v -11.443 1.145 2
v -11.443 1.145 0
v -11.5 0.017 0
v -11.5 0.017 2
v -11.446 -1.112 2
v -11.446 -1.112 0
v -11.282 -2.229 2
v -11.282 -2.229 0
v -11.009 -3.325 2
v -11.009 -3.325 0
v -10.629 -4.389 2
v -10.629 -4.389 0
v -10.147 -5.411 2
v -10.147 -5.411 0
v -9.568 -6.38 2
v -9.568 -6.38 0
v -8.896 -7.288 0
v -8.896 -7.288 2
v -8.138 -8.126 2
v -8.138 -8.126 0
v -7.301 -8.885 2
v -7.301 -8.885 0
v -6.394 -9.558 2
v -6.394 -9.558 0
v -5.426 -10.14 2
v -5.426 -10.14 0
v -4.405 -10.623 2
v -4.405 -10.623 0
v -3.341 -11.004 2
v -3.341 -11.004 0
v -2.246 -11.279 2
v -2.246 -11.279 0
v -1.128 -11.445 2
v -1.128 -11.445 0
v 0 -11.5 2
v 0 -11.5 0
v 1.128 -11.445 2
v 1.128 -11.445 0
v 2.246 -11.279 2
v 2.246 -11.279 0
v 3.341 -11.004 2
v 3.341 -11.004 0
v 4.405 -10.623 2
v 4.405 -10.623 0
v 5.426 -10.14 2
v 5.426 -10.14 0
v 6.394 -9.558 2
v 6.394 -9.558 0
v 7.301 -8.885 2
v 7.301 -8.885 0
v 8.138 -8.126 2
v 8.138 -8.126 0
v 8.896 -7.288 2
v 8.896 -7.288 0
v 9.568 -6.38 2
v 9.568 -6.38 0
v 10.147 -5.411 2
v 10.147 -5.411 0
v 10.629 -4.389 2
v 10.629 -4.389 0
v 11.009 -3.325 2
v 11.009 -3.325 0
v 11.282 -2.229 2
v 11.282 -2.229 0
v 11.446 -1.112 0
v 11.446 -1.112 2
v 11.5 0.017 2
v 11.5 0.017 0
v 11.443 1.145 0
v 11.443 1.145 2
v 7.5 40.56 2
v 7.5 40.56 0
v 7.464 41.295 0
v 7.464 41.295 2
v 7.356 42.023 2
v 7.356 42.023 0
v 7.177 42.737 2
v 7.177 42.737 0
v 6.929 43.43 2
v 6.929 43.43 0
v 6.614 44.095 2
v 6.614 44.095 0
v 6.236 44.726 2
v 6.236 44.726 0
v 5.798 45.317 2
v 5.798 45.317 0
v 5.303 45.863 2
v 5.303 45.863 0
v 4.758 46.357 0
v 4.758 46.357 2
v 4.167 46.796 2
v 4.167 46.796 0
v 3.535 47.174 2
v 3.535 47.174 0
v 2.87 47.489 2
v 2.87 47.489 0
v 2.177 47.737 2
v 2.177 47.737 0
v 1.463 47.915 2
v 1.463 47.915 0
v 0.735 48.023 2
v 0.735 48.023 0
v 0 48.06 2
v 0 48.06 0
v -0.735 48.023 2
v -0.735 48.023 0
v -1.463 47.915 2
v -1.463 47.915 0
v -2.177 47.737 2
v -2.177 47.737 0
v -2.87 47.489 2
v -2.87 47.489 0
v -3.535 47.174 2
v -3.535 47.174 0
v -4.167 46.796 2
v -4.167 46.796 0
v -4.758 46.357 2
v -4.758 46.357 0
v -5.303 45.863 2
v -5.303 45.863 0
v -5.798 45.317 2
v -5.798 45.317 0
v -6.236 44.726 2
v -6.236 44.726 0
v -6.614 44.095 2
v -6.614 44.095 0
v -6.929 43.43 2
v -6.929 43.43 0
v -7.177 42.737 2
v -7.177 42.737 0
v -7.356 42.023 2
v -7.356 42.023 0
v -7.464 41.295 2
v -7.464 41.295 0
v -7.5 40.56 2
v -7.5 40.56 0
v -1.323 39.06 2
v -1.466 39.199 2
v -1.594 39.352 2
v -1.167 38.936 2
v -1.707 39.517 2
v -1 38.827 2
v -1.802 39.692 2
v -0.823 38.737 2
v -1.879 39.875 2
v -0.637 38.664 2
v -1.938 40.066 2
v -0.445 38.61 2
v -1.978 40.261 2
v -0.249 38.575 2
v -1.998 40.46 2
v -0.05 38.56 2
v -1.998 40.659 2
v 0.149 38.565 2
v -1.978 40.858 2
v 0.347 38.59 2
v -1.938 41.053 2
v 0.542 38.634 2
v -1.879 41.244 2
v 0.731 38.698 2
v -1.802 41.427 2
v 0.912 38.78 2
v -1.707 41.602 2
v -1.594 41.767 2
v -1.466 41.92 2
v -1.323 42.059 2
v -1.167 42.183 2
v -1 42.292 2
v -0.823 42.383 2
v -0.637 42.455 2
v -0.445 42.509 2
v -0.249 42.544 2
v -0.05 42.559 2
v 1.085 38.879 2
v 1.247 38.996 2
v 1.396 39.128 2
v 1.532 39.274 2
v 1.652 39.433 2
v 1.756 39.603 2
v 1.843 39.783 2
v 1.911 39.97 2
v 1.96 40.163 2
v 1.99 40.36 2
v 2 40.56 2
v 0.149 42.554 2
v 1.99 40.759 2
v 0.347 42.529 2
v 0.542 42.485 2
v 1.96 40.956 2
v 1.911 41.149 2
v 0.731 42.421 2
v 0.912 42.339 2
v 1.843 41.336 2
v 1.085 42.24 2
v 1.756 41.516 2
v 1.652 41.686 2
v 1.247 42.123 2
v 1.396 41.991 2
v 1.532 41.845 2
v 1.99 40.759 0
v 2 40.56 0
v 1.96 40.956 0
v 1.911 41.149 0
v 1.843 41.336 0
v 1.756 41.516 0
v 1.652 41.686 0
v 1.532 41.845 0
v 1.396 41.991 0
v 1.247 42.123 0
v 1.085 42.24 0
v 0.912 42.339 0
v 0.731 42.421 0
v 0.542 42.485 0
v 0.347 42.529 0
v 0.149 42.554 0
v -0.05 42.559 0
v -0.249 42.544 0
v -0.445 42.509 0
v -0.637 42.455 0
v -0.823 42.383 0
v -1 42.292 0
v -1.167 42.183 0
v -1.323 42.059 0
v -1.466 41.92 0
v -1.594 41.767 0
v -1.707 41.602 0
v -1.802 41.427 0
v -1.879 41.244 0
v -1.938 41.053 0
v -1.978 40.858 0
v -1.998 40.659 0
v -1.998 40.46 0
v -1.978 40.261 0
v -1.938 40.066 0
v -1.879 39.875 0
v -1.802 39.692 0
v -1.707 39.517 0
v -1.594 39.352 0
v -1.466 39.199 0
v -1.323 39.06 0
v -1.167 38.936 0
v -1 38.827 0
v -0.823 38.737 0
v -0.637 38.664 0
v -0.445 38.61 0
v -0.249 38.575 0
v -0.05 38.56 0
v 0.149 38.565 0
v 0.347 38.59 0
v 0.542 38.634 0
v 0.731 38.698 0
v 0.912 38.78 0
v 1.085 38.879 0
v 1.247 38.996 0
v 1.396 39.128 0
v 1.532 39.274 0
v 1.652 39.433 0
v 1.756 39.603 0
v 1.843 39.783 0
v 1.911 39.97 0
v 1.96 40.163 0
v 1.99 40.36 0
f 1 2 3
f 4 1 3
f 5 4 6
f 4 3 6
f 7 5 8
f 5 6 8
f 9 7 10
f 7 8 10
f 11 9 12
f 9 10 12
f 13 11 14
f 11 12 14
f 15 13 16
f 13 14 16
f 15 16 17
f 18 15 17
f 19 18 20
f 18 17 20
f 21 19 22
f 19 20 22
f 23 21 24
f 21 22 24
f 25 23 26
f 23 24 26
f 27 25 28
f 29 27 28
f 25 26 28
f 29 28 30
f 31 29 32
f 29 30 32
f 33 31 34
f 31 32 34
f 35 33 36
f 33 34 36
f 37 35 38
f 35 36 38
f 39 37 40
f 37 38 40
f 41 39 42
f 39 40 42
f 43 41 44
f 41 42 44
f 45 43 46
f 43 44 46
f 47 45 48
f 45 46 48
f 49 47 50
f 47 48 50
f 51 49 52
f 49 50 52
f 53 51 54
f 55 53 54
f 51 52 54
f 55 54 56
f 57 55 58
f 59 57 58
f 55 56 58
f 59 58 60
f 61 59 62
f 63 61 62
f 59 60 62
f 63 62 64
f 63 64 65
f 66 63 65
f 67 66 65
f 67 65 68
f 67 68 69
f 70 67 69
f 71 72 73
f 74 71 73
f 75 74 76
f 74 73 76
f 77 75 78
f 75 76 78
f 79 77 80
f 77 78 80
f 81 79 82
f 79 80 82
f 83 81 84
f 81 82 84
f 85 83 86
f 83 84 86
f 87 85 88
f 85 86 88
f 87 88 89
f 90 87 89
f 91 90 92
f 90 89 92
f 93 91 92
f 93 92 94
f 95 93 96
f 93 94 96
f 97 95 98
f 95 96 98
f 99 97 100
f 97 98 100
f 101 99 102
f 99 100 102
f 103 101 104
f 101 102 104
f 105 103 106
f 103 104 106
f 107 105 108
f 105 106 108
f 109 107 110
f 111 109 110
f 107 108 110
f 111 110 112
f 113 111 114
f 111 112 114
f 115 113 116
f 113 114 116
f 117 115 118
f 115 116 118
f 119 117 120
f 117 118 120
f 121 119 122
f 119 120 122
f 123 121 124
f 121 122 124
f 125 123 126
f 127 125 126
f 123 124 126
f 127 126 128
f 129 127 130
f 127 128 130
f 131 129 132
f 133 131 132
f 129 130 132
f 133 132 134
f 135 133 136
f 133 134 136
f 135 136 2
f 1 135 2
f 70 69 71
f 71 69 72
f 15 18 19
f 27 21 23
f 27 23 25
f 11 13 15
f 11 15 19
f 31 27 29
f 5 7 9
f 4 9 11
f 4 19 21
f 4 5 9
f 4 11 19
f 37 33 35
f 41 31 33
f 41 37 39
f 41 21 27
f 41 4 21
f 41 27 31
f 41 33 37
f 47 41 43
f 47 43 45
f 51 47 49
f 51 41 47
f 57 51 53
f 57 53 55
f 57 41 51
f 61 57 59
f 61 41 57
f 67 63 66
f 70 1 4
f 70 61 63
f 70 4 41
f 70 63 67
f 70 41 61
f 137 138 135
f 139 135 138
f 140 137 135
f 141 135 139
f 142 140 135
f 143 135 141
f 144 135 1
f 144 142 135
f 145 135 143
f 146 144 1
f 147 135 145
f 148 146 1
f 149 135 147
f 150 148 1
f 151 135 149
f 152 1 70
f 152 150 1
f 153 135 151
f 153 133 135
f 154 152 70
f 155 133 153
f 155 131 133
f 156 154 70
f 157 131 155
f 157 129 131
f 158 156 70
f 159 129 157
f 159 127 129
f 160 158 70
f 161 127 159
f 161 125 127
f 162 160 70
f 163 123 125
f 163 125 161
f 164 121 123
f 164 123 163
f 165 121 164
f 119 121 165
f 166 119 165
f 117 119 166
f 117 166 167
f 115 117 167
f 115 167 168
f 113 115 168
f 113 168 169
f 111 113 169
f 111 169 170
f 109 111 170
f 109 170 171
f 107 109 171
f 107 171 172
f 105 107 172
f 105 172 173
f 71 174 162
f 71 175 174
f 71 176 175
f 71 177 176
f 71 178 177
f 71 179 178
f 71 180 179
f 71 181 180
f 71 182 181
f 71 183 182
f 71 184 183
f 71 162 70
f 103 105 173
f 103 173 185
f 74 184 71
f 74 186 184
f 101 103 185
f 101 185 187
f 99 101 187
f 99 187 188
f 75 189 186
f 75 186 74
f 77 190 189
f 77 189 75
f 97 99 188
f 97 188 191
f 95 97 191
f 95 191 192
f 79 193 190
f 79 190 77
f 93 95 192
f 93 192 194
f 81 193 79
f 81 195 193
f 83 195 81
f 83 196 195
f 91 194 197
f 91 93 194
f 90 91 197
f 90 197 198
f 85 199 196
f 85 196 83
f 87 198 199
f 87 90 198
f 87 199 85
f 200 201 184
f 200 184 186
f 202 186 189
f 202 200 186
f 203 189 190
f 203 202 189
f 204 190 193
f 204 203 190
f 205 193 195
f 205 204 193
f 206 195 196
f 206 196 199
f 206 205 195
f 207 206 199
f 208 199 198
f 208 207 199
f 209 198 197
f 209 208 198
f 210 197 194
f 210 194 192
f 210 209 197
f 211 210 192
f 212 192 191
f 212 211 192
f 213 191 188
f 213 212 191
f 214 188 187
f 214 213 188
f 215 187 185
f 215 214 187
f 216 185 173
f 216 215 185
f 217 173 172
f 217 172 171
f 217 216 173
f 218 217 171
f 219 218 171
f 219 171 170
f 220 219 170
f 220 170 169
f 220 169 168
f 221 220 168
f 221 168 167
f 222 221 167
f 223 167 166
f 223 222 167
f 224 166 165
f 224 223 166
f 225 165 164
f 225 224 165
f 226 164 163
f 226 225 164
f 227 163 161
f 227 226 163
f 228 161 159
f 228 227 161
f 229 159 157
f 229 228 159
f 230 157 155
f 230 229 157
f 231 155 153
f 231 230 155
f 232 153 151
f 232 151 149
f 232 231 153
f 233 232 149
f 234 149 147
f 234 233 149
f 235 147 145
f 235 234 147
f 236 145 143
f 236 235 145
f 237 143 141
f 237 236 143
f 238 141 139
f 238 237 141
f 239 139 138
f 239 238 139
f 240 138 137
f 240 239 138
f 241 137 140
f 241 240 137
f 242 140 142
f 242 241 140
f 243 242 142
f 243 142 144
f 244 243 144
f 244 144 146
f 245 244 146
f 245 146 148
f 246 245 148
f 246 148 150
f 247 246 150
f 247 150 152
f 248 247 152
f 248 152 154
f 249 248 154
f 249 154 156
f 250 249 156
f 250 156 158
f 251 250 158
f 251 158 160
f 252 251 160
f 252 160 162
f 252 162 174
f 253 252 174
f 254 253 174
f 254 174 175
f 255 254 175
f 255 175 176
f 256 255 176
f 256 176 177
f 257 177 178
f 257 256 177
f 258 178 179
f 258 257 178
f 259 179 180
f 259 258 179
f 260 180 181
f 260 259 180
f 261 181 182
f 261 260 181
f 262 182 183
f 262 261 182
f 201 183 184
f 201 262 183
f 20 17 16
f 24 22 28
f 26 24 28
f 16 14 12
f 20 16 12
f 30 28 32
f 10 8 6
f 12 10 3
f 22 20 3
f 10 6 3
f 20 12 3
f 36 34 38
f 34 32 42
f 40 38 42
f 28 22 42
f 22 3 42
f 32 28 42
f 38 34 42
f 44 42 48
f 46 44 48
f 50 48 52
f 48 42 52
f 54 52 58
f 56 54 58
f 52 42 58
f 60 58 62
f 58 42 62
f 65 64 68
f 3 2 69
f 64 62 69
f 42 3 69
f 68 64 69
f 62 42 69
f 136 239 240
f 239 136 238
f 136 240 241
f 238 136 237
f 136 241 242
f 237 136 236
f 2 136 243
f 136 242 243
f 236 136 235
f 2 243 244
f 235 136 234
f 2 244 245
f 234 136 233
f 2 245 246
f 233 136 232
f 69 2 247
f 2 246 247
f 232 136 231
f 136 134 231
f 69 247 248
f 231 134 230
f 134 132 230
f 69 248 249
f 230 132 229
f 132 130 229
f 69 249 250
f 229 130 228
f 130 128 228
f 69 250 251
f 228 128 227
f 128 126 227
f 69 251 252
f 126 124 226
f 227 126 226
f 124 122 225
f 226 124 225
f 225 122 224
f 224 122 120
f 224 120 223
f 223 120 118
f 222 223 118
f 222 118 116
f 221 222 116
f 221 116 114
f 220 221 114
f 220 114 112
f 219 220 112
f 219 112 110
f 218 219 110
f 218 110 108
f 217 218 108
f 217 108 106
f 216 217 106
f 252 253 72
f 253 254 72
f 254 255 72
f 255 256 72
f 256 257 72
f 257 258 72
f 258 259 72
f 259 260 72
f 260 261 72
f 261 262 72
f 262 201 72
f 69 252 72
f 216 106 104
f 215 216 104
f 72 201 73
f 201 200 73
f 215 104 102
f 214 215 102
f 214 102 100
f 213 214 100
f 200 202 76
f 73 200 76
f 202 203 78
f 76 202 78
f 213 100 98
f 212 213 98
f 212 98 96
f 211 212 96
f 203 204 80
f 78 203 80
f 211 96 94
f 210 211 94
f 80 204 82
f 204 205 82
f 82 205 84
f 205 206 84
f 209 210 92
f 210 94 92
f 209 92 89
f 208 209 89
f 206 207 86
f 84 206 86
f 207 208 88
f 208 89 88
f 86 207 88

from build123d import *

# Parameters (mm, degrees)
F0_R     = 2
F1_DEPTH = 2


with BuildPart() as f1:
    # F0 (on Top) → F1 (new body)
    with BuildSketch(Plane.XY):
        with BuildLine():
            Line((-7.5, 40.559527), (-11.442887, 1.144696))
            ThreePointArc((-11.442887, 1.144696), (0, -11.5), (11.442887, 1.144696))
            Line((11.442887, 1.144696), (7.5, 40.559527))
            ThreePointArc((7.5, 40.559527), (0, 48.059527), (-7.5, 40.559527))
        make_face()
        with Locations((0, 40.559527)):
            Circle(F0_R, mode=Mode.SUBTRACT)
    extrude(amount=F1_DEPTH)


solid = f1.part
